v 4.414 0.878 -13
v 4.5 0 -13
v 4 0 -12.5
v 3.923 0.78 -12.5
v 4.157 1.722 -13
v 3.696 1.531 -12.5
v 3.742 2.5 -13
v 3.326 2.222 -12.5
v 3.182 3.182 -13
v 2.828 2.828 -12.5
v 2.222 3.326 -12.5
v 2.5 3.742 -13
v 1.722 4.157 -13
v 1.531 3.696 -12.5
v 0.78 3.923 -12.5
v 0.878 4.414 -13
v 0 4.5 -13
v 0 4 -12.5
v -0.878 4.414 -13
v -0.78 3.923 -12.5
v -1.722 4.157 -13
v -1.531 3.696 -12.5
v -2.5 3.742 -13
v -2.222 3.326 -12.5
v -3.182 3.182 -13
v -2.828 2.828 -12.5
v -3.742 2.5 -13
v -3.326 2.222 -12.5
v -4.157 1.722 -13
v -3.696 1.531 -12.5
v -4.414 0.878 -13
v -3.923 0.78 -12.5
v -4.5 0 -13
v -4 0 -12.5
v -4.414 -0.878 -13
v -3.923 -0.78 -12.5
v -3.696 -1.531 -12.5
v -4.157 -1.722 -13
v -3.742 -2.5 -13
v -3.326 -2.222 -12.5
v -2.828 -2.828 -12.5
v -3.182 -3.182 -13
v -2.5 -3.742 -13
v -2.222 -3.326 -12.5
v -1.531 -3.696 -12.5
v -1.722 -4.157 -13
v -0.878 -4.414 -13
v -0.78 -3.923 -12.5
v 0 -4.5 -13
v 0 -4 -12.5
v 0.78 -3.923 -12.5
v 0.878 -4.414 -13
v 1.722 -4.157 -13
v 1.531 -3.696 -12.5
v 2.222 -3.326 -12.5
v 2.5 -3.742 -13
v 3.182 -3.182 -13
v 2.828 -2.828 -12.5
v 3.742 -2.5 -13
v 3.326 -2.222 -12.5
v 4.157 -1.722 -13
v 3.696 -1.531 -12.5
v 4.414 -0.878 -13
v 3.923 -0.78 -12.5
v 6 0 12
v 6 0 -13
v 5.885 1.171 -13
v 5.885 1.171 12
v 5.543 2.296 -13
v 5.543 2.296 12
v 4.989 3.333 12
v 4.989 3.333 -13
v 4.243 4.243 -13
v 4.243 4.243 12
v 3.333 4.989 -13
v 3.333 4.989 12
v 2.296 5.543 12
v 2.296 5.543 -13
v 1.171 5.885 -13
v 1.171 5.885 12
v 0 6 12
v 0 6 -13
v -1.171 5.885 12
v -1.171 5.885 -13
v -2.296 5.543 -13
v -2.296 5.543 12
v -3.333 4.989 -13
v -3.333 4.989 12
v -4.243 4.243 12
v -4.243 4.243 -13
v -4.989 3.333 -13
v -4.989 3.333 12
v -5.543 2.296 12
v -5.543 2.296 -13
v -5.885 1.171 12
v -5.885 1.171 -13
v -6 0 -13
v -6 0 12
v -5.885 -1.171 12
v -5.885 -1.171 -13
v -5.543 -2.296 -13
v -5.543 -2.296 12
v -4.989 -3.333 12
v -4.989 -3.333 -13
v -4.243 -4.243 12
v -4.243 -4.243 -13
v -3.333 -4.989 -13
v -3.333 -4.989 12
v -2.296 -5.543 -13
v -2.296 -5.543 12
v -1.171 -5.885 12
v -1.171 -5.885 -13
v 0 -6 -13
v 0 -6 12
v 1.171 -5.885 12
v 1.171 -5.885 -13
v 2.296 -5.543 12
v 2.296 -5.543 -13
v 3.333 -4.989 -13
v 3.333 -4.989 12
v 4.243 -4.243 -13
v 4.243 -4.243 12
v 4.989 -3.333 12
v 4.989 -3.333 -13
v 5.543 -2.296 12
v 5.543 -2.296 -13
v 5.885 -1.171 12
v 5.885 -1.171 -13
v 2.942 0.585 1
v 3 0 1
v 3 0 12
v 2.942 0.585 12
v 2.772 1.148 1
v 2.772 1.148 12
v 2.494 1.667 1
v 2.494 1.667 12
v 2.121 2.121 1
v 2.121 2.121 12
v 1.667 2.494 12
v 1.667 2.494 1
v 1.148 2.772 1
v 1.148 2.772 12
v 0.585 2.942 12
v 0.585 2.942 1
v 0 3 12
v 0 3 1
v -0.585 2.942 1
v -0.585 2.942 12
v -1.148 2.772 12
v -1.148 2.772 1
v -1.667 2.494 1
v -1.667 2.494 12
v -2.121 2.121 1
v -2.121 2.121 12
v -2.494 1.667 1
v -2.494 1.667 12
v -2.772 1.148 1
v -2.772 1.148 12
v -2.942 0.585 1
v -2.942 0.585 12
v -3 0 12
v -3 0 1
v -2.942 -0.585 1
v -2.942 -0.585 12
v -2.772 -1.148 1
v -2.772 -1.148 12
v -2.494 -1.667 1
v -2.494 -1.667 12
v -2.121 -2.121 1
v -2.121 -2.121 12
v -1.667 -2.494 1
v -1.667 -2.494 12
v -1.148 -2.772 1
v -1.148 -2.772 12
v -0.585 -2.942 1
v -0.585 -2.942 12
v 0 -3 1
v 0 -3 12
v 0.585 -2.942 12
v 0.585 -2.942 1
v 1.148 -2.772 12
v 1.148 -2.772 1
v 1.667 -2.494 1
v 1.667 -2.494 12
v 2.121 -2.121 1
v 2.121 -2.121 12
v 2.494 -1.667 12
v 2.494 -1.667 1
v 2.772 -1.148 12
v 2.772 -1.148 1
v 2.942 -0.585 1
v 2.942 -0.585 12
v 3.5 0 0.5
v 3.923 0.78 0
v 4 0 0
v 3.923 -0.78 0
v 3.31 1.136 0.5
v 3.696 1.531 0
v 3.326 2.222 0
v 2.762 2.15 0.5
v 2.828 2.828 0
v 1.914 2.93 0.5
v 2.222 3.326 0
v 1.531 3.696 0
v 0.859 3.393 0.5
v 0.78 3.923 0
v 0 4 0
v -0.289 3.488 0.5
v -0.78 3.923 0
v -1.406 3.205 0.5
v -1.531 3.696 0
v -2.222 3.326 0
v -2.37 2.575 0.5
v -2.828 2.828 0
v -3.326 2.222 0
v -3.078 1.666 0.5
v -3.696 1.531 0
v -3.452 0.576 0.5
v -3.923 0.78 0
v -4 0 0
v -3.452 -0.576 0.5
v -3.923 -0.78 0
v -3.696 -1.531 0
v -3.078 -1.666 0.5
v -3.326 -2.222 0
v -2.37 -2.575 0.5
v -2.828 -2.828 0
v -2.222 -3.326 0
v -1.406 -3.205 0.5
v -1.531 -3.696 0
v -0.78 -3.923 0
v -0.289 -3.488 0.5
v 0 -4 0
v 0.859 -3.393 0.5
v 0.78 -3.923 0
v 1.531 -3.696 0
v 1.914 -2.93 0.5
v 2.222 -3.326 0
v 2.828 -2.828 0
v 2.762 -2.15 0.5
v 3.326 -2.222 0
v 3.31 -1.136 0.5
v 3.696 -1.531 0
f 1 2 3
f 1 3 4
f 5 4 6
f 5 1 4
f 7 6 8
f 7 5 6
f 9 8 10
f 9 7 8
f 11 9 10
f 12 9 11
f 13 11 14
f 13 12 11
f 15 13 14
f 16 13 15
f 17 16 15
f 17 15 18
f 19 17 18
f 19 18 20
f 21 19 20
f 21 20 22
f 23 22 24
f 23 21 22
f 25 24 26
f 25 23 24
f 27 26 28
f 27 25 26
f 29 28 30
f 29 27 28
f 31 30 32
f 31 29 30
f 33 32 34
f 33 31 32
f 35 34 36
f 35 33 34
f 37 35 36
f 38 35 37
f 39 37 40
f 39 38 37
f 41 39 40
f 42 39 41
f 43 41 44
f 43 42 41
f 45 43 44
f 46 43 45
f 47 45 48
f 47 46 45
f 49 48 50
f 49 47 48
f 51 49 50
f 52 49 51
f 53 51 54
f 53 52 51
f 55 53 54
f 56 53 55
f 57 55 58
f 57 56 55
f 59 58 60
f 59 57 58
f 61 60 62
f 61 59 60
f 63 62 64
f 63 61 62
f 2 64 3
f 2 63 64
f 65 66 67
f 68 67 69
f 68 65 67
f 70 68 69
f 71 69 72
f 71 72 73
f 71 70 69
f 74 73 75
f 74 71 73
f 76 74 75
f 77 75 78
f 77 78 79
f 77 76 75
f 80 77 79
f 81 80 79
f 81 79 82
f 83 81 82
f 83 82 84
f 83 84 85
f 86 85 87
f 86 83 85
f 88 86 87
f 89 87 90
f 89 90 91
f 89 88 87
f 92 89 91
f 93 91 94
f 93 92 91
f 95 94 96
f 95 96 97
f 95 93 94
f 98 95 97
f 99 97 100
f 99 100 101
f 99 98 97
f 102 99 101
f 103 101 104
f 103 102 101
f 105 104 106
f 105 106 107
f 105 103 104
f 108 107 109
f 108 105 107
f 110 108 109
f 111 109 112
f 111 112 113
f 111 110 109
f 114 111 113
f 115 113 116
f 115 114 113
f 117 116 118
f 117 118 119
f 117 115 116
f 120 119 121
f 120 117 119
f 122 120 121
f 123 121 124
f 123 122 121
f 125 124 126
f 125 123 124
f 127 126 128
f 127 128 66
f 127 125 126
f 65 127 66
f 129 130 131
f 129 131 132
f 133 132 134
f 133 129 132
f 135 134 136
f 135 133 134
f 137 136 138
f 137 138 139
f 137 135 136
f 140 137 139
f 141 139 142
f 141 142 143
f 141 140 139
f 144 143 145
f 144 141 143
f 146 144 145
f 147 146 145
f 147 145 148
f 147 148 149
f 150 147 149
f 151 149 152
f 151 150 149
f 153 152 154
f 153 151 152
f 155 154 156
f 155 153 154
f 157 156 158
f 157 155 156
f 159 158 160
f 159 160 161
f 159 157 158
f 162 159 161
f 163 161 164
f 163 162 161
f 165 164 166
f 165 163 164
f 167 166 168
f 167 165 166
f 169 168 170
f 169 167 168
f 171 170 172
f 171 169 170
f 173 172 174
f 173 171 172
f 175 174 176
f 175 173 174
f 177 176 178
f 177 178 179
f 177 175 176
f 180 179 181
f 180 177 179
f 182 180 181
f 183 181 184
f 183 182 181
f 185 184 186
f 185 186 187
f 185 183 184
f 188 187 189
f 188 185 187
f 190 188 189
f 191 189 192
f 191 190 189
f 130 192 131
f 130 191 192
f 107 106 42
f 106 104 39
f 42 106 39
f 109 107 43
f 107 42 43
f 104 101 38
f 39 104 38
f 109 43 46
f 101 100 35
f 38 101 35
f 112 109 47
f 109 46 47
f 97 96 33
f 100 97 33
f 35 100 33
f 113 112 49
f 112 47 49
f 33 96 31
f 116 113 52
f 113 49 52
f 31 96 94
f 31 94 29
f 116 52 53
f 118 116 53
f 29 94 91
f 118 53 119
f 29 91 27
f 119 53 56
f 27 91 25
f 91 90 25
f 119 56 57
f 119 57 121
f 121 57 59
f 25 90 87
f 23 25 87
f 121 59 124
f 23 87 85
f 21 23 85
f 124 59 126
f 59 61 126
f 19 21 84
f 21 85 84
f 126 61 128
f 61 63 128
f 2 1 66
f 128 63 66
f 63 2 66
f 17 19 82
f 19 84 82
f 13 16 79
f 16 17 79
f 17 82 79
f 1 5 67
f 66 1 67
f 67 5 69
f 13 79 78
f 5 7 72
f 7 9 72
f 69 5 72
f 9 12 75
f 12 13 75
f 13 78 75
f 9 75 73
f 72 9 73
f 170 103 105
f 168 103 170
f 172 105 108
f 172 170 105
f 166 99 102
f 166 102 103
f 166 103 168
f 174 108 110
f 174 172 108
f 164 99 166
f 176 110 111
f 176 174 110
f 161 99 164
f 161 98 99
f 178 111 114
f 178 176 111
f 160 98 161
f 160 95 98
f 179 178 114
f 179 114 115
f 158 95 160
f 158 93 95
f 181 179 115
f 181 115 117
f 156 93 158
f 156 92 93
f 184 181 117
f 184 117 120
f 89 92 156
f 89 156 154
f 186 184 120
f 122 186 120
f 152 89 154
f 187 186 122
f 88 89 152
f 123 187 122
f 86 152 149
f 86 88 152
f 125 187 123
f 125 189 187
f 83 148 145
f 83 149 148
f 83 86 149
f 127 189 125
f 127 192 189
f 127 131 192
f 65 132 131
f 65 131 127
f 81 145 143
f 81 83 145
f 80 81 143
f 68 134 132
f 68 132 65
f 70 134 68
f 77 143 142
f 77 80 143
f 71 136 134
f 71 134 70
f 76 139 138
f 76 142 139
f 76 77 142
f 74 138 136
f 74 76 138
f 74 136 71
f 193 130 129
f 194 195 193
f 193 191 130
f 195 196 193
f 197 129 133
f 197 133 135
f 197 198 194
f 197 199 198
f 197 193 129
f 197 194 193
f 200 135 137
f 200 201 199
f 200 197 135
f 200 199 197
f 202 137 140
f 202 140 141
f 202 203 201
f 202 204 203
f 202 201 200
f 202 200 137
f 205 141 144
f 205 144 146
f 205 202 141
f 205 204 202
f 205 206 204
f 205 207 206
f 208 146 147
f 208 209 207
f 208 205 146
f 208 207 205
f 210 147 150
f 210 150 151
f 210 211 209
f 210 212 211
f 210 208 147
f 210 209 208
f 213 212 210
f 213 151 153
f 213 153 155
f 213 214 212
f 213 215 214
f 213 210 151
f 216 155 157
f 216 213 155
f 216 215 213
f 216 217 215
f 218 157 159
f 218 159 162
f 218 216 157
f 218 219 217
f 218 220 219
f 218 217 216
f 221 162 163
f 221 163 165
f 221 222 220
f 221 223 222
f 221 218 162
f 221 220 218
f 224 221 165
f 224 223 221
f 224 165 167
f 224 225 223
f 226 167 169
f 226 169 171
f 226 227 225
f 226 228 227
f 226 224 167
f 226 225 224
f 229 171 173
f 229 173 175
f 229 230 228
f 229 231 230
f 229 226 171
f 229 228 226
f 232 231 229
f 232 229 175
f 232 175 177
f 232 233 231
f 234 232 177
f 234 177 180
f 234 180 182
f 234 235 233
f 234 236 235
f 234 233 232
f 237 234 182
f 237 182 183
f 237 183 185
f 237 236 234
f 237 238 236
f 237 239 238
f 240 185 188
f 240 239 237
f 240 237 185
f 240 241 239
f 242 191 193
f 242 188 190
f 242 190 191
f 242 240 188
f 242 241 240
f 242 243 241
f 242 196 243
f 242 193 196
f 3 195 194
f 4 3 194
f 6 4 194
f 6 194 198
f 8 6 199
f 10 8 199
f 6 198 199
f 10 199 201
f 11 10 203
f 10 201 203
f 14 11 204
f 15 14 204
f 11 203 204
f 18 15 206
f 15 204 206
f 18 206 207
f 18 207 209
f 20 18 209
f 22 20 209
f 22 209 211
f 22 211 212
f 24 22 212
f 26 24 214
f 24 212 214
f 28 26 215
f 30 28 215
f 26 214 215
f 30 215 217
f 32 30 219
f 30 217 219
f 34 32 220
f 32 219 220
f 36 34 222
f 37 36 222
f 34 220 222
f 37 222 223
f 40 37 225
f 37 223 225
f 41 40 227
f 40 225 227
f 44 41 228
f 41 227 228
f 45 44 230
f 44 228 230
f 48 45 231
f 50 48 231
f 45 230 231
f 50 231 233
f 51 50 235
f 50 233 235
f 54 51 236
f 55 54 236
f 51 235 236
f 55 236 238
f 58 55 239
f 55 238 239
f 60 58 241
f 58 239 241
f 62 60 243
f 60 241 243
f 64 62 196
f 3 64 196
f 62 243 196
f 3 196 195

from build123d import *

# Parameters (mm, degrees)
F0_R     = 6
F0_R_2   = 4
F1_DEPTH = 13
F0_R_3   = 3
F2_DEPTH = 12
F3_SIZE  = 0.99999
F4_SIZE  = 0.5


# Not quite as in the source:
# - a fillet or chamfer is up to 0.001 mm smaller than in the source, because OpenCascade refuses the exact size


with BuildPart() as f1:
    # F0 (on Top) → F1 (new body)
    with BuildSketch(Plane.XY):
        Circle(F0_R)
        Circle(F0_R_2, mode=Mode.SUBTRACT)
    extrude(amount=-F1_DEPTH)

    # F0 (on Top) → F2 (join)
    with BuildSketch(Plane.XY):
        Circle(F0_R)
        Circle(F0_R_2, mode=Mode.SUBTRACT)
        Circle(F0_R_2)
        Circle(F0_R_3, mode=Mode.SUBTRACT)
    extrude(amount=F2_DEPTH)

    # F3 (size 1 in the source; OpenCascade refuses exactly that, so slightly less here)
    f3_edges = [f1.edges().sort_by_distance(p)[0] for p in [
        (-3, 0, 0),
    ]]
    chamfer(f3_edges, length=F3_SIZE)

    # F4
    f4_edges = [f1.edges().sort_by_distance(p)[0] for p in [
        (-4, 0, -13),
    ]]
    chamfer(f4_edges, length=F4_SIZE)


solid = f1.part
